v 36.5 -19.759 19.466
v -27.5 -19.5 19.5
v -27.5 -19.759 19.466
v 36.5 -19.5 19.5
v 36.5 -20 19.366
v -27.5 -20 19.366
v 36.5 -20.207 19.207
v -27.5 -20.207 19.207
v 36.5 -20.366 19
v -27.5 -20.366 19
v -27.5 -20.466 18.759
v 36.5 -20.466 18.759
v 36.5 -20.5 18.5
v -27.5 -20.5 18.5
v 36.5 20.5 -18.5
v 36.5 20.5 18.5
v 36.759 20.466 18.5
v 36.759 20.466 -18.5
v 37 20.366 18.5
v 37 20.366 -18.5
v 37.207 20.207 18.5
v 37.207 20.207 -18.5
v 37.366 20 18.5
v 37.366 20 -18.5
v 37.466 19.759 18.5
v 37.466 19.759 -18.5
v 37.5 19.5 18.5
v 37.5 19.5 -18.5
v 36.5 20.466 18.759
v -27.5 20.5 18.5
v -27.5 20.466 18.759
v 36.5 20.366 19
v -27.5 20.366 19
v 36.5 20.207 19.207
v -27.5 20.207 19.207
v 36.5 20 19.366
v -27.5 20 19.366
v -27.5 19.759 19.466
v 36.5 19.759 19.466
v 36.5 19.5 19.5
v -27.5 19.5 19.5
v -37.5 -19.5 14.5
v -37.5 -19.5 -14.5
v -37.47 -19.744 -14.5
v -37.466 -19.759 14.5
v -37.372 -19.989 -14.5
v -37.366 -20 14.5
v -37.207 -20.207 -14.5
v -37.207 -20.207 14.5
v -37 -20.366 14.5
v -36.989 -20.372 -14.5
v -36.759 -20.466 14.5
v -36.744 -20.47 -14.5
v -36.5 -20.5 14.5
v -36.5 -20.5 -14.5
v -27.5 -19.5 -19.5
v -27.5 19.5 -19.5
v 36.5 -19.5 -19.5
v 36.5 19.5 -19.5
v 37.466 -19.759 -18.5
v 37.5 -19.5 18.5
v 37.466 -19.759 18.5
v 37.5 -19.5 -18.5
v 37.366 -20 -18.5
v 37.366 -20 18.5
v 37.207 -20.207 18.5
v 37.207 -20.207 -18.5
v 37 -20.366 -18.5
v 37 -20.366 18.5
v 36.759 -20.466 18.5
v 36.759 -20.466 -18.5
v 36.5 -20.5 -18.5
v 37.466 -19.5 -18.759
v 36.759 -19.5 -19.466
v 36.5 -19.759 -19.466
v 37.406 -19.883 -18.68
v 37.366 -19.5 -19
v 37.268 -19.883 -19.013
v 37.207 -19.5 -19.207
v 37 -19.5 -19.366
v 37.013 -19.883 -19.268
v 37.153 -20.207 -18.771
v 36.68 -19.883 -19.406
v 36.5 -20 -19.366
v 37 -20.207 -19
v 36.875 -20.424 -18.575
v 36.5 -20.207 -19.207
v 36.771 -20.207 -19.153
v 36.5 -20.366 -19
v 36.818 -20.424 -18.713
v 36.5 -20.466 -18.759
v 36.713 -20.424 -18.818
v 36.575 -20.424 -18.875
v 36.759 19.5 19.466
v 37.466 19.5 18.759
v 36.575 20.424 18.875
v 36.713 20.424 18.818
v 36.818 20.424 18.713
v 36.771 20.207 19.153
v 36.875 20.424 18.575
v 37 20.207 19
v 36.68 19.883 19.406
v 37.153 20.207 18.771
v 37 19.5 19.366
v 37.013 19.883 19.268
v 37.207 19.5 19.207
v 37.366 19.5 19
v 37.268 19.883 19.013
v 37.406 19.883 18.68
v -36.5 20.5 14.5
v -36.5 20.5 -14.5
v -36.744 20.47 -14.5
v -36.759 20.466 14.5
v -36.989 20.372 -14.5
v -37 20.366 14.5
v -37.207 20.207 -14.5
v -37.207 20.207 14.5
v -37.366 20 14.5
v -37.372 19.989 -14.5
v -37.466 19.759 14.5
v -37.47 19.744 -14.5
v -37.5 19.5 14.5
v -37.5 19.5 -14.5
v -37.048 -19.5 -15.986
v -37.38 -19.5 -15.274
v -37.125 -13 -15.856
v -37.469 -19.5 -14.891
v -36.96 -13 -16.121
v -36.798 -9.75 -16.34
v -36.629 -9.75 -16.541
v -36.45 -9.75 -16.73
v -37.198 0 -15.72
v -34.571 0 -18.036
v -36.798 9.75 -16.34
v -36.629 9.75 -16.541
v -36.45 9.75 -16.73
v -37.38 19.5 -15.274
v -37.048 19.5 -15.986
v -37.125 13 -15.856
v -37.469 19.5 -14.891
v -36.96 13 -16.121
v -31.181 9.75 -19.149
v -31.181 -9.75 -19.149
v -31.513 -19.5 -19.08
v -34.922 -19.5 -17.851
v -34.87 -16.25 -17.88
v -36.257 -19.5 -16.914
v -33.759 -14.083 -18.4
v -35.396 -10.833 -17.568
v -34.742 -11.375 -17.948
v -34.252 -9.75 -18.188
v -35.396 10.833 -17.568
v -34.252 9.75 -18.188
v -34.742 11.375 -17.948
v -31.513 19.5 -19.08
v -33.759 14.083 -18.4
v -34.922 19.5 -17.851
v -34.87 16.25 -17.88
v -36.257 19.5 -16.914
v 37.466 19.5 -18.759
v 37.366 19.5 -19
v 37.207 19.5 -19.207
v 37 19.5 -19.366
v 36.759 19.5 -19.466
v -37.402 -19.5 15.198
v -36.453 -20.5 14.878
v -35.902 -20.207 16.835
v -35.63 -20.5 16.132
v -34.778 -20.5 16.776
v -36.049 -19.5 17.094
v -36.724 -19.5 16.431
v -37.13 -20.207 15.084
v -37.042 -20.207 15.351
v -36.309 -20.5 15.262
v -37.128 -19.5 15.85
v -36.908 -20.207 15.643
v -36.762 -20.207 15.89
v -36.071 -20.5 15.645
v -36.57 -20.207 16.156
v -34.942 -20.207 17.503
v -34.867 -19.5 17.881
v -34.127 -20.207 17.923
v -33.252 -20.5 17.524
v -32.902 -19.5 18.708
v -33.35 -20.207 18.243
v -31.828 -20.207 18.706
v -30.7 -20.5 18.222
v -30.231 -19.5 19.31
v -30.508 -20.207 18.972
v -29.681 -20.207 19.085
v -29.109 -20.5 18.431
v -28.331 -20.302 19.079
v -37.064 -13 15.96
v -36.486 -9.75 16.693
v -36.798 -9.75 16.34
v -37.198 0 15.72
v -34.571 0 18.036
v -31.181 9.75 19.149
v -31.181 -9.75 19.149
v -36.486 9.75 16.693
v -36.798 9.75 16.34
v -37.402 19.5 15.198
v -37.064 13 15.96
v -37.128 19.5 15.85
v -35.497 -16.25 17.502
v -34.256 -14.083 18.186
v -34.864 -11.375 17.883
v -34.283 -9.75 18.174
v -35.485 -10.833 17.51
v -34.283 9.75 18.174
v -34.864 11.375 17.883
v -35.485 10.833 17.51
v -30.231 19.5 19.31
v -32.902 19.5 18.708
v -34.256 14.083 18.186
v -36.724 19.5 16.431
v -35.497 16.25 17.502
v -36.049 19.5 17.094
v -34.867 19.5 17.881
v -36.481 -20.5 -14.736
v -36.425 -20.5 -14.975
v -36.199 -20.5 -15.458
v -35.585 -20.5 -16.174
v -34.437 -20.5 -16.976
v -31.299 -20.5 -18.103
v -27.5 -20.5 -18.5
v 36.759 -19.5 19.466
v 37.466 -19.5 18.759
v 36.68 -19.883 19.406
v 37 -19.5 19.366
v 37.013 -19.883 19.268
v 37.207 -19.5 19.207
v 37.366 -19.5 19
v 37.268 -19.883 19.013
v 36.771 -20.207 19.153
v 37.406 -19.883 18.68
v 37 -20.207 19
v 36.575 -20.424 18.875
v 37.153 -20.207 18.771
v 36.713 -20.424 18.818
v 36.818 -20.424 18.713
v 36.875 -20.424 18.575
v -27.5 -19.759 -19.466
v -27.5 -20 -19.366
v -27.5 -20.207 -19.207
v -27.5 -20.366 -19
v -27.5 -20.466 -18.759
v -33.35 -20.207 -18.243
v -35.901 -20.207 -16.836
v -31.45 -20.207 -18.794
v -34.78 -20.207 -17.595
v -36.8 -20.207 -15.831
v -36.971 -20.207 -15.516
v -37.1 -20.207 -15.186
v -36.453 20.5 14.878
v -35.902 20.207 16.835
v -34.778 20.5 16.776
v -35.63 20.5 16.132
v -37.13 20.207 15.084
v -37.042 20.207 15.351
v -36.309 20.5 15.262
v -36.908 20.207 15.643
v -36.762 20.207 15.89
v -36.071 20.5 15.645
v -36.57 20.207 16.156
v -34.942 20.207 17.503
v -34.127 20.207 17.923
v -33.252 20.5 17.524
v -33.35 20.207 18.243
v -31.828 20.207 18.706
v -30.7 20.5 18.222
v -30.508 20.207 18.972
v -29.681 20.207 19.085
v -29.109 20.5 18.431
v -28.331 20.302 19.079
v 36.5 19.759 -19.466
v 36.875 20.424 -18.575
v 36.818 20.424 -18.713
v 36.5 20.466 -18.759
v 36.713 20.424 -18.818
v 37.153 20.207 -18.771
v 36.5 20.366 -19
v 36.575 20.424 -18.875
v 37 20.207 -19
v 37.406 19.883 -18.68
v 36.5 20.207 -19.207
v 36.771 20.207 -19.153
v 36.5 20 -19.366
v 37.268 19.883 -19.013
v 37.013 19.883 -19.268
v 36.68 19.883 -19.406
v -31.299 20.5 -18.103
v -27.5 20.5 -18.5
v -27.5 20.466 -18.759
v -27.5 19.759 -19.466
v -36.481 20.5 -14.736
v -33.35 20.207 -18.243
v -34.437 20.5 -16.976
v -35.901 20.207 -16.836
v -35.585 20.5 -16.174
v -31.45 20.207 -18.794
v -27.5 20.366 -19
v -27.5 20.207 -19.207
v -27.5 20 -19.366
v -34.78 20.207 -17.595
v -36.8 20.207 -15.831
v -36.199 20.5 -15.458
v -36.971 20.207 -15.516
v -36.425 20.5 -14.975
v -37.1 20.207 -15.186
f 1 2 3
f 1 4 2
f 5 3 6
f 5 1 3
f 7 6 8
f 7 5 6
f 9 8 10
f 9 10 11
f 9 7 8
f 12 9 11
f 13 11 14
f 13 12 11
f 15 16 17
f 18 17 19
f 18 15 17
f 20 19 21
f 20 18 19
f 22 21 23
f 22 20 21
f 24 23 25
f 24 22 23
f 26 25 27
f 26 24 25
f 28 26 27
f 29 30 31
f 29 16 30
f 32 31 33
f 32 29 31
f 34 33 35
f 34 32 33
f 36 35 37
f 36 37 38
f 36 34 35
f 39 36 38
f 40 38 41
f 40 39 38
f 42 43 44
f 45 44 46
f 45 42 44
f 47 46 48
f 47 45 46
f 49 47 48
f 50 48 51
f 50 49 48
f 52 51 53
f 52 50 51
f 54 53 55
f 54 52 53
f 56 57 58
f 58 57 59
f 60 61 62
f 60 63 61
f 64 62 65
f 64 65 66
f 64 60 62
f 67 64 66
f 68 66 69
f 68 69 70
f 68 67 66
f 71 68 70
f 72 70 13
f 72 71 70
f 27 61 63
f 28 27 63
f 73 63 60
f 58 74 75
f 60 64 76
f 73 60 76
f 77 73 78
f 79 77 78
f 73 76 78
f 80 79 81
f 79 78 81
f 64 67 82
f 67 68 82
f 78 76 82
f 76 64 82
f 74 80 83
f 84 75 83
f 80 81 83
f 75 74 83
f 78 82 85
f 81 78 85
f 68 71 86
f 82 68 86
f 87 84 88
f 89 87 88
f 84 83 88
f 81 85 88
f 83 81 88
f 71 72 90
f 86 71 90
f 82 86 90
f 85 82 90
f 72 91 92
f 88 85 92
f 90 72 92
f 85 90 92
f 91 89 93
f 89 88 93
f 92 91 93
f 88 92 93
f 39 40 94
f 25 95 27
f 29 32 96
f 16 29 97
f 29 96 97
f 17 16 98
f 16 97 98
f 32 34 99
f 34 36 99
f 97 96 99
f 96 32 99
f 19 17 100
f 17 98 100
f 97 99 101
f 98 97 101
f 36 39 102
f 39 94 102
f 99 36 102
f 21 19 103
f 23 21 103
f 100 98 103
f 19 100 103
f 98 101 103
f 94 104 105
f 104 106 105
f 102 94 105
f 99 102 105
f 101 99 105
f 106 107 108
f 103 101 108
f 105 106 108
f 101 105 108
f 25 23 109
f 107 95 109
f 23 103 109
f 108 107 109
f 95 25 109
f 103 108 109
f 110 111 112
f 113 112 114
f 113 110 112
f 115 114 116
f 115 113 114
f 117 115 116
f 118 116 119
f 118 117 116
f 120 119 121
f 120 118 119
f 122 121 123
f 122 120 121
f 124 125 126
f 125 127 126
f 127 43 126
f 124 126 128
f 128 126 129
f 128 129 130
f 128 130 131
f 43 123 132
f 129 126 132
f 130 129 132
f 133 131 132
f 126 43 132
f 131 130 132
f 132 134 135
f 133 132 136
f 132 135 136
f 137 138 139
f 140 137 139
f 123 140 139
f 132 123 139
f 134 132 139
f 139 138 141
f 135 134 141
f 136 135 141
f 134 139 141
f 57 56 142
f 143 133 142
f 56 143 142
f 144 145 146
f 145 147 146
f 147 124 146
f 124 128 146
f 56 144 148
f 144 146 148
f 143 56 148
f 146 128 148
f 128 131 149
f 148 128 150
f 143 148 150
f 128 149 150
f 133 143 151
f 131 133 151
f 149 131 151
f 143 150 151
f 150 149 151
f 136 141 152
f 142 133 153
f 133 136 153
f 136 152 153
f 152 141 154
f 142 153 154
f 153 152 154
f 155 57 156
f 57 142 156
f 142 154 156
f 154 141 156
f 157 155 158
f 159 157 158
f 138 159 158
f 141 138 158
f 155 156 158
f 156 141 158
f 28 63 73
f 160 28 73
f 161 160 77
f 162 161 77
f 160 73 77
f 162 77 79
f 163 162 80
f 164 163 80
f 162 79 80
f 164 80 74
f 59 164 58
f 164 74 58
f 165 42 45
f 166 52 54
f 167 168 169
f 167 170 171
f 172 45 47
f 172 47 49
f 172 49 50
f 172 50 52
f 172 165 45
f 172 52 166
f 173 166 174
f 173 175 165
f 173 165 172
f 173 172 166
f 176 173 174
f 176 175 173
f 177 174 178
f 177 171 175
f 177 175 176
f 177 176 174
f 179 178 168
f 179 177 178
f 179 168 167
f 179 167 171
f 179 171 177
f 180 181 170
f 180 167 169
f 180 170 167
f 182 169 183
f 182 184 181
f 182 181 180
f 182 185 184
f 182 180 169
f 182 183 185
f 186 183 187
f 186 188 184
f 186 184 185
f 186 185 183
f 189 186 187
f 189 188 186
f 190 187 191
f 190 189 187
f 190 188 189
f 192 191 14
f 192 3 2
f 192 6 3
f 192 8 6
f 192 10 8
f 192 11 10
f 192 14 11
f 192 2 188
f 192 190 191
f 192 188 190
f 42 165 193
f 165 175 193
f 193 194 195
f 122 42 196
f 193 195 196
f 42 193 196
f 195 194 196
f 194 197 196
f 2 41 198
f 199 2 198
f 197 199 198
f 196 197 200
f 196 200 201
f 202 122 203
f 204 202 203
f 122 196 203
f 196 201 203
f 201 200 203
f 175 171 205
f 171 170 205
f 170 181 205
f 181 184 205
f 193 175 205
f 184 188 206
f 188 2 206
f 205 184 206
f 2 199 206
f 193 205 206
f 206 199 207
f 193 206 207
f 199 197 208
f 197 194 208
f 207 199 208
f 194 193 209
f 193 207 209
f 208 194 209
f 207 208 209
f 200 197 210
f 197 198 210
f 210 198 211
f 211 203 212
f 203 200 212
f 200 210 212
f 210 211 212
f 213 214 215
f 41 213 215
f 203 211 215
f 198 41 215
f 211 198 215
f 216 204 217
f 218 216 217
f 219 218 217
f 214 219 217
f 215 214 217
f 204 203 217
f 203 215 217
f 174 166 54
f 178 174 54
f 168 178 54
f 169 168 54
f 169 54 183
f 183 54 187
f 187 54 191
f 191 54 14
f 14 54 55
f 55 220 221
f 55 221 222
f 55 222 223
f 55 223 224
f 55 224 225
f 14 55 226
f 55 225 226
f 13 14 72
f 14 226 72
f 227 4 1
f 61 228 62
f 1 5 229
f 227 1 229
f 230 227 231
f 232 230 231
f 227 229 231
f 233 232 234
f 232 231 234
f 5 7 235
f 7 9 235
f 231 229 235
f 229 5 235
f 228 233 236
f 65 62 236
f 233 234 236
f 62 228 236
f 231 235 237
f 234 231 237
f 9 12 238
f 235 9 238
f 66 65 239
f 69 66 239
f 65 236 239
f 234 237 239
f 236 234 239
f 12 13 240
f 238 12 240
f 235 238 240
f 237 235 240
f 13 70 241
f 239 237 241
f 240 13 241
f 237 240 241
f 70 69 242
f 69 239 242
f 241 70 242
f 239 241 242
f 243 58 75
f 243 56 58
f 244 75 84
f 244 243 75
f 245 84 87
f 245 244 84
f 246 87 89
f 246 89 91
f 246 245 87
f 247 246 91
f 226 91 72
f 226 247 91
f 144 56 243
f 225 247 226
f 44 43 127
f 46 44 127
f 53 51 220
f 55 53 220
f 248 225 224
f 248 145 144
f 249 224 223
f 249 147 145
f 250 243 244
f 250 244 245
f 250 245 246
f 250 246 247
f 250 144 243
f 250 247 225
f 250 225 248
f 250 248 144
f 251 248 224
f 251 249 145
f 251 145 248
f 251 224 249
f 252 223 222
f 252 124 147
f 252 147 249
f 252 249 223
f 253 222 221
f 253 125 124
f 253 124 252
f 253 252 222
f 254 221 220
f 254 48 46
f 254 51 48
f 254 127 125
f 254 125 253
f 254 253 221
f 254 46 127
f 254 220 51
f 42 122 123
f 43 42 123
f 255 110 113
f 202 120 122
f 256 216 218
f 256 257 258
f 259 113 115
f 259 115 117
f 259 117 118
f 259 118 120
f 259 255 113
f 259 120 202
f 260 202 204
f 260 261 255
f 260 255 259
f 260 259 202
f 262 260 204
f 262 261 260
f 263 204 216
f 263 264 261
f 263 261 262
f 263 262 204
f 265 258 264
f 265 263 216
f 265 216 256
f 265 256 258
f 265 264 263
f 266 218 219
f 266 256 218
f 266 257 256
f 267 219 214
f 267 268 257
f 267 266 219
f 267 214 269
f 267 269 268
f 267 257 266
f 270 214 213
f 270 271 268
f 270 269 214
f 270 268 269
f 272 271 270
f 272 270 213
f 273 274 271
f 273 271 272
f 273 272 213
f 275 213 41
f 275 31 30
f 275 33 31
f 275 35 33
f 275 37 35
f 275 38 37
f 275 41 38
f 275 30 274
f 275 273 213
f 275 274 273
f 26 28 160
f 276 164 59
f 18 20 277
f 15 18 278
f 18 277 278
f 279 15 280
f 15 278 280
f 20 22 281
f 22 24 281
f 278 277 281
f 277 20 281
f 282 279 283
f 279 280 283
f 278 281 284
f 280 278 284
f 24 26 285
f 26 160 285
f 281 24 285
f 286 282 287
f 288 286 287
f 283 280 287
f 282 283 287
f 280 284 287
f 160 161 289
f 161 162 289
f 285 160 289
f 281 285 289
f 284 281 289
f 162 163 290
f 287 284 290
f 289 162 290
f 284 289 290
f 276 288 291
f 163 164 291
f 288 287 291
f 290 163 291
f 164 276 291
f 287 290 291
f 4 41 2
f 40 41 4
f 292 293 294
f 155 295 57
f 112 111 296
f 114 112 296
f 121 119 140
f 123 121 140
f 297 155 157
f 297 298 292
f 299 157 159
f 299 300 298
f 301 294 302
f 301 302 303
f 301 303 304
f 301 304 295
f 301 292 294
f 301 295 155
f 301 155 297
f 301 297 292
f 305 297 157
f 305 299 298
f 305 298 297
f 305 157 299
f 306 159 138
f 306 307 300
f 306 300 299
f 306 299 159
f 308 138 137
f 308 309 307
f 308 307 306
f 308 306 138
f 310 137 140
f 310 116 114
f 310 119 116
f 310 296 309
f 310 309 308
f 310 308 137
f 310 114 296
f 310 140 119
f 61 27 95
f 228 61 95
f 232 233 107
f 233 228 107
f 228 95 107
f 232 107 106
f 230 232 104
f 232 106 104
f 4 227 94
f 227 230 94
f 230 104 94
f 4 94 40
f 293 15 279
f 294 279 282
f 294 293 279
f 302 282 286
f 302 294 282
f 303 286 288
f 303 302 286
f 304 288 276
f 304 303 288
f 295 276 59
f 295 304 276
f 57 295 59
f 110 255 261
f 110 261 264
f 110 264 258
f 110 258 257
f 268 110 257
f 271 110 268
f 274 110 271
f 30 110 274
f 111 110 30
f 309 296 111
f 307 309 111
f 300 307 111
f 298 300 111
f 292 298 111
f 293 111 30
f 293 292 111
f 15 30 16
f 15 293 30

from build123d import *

# Parameters (mm, degrees)
SKETCH1_W           = 75
SKETCH1_H           = 39
BOSS_EXTRUDE1_DEPTH = 20.5
FILLET1_R           = 1
FILLET2_SIZE        = 5
FILLET2_SIZE_2      = 10
FILLET3_R           = 1


with BuildPart() as part:
    # Sketch1 → Boss-Extrude1 (new, symmetric)
    with BuildSketch(Plane(origin=(0, 0, 0), x_dir=(1, 0, 0), z_dir=(0, 1, 0))):
        Rectangle(SKETCH1_W, SKETCH1_H)
    extrude(amount=BOSS_EXTRUDE1_DEPTH, both=True)

    # Fillet1
    fillet1_edges = [part.edges().sort_by_distance(p)[0] for p in [
        (37.5, 0, 19.5),
        (37.5, 0, -19.5),
    ]]
    fillet(fillet1_edges, radius=FILLET1_R)

    # Fillet2
    # an asymmetric fillet: 10, 5 mm, written as the material it takes off along each edge
    with BuildSketch(Plane(origin=(-37.5, 45.5, -19.5), x_dir=(0, 0, 1), z_dir=(0, -1, 0))) as fillet2_piece_1:
        with BuildLine():
            Bezier((FILLET2_SIZE, 0), (0, 0), (0, -FILLET2_SIZE_2), weights=[1, 0.707106781, 1])
            Line((0, -FILLET2_SIZE_2), (0, 0))
            Line((0, 0), (FILLET2_SIZE, 0))
        make_face()
    extrude(amount=91, mode=Mode.SUBTRACT)
    with BuildSketch(Plane(origin=(-37.5, 45.5, 19.5), x_dir=(1, 0, 0), z_dir=(0, -1, 0))) as fillet2_piece_2:
        with BuildLine():
            Bezier((FILLET2_SIZE_2, 0), (0, 0), (0, -FILLET2_SIZE), weights=[1, 0.707106781, 1])
            Line((0, -FILLET2_SIZE), (0, 0))
            Line((0, 0), (FILLET2_SIZE_2, 0))
        make_face()
    extrude(amount=91, mode=Mode.SUBTRACT)

    # Fillet3
    fillet3_edges = [part.edges().sort_by_distance(p)[0] for p in [
        (-33.444718917, -20.5, 18.52058196),
        (-37.5, -20.5, 0),
        (-33.444718915, -20.5, -18.520581957),
        (4.5, -20.5, -19.5),
        (37.207106781, -20.5, -19.207106781),
        (37.5, -20.5, 0),
        (37.207106781, -20.5, 19.207106781),
        (-33.444718917, 20.5, 18.52058196),
        (-37.5, 20.5, 0),
        (-33.444718915, 20.5, -18.520581957),
        (4.5, 20.5, -19.5),
        (37.207106781, 20.5, -19.207106781),
        (37.5, 20.5, 0),
        (37.207106781, 20.5, 19.207106781),
        (4.5, -20.5, 19.5),
        (4.5, 20.5, 19.5),
    ]]
    fillet(fillet3_edges, radius=FILLET3_R)


solid = part.part
